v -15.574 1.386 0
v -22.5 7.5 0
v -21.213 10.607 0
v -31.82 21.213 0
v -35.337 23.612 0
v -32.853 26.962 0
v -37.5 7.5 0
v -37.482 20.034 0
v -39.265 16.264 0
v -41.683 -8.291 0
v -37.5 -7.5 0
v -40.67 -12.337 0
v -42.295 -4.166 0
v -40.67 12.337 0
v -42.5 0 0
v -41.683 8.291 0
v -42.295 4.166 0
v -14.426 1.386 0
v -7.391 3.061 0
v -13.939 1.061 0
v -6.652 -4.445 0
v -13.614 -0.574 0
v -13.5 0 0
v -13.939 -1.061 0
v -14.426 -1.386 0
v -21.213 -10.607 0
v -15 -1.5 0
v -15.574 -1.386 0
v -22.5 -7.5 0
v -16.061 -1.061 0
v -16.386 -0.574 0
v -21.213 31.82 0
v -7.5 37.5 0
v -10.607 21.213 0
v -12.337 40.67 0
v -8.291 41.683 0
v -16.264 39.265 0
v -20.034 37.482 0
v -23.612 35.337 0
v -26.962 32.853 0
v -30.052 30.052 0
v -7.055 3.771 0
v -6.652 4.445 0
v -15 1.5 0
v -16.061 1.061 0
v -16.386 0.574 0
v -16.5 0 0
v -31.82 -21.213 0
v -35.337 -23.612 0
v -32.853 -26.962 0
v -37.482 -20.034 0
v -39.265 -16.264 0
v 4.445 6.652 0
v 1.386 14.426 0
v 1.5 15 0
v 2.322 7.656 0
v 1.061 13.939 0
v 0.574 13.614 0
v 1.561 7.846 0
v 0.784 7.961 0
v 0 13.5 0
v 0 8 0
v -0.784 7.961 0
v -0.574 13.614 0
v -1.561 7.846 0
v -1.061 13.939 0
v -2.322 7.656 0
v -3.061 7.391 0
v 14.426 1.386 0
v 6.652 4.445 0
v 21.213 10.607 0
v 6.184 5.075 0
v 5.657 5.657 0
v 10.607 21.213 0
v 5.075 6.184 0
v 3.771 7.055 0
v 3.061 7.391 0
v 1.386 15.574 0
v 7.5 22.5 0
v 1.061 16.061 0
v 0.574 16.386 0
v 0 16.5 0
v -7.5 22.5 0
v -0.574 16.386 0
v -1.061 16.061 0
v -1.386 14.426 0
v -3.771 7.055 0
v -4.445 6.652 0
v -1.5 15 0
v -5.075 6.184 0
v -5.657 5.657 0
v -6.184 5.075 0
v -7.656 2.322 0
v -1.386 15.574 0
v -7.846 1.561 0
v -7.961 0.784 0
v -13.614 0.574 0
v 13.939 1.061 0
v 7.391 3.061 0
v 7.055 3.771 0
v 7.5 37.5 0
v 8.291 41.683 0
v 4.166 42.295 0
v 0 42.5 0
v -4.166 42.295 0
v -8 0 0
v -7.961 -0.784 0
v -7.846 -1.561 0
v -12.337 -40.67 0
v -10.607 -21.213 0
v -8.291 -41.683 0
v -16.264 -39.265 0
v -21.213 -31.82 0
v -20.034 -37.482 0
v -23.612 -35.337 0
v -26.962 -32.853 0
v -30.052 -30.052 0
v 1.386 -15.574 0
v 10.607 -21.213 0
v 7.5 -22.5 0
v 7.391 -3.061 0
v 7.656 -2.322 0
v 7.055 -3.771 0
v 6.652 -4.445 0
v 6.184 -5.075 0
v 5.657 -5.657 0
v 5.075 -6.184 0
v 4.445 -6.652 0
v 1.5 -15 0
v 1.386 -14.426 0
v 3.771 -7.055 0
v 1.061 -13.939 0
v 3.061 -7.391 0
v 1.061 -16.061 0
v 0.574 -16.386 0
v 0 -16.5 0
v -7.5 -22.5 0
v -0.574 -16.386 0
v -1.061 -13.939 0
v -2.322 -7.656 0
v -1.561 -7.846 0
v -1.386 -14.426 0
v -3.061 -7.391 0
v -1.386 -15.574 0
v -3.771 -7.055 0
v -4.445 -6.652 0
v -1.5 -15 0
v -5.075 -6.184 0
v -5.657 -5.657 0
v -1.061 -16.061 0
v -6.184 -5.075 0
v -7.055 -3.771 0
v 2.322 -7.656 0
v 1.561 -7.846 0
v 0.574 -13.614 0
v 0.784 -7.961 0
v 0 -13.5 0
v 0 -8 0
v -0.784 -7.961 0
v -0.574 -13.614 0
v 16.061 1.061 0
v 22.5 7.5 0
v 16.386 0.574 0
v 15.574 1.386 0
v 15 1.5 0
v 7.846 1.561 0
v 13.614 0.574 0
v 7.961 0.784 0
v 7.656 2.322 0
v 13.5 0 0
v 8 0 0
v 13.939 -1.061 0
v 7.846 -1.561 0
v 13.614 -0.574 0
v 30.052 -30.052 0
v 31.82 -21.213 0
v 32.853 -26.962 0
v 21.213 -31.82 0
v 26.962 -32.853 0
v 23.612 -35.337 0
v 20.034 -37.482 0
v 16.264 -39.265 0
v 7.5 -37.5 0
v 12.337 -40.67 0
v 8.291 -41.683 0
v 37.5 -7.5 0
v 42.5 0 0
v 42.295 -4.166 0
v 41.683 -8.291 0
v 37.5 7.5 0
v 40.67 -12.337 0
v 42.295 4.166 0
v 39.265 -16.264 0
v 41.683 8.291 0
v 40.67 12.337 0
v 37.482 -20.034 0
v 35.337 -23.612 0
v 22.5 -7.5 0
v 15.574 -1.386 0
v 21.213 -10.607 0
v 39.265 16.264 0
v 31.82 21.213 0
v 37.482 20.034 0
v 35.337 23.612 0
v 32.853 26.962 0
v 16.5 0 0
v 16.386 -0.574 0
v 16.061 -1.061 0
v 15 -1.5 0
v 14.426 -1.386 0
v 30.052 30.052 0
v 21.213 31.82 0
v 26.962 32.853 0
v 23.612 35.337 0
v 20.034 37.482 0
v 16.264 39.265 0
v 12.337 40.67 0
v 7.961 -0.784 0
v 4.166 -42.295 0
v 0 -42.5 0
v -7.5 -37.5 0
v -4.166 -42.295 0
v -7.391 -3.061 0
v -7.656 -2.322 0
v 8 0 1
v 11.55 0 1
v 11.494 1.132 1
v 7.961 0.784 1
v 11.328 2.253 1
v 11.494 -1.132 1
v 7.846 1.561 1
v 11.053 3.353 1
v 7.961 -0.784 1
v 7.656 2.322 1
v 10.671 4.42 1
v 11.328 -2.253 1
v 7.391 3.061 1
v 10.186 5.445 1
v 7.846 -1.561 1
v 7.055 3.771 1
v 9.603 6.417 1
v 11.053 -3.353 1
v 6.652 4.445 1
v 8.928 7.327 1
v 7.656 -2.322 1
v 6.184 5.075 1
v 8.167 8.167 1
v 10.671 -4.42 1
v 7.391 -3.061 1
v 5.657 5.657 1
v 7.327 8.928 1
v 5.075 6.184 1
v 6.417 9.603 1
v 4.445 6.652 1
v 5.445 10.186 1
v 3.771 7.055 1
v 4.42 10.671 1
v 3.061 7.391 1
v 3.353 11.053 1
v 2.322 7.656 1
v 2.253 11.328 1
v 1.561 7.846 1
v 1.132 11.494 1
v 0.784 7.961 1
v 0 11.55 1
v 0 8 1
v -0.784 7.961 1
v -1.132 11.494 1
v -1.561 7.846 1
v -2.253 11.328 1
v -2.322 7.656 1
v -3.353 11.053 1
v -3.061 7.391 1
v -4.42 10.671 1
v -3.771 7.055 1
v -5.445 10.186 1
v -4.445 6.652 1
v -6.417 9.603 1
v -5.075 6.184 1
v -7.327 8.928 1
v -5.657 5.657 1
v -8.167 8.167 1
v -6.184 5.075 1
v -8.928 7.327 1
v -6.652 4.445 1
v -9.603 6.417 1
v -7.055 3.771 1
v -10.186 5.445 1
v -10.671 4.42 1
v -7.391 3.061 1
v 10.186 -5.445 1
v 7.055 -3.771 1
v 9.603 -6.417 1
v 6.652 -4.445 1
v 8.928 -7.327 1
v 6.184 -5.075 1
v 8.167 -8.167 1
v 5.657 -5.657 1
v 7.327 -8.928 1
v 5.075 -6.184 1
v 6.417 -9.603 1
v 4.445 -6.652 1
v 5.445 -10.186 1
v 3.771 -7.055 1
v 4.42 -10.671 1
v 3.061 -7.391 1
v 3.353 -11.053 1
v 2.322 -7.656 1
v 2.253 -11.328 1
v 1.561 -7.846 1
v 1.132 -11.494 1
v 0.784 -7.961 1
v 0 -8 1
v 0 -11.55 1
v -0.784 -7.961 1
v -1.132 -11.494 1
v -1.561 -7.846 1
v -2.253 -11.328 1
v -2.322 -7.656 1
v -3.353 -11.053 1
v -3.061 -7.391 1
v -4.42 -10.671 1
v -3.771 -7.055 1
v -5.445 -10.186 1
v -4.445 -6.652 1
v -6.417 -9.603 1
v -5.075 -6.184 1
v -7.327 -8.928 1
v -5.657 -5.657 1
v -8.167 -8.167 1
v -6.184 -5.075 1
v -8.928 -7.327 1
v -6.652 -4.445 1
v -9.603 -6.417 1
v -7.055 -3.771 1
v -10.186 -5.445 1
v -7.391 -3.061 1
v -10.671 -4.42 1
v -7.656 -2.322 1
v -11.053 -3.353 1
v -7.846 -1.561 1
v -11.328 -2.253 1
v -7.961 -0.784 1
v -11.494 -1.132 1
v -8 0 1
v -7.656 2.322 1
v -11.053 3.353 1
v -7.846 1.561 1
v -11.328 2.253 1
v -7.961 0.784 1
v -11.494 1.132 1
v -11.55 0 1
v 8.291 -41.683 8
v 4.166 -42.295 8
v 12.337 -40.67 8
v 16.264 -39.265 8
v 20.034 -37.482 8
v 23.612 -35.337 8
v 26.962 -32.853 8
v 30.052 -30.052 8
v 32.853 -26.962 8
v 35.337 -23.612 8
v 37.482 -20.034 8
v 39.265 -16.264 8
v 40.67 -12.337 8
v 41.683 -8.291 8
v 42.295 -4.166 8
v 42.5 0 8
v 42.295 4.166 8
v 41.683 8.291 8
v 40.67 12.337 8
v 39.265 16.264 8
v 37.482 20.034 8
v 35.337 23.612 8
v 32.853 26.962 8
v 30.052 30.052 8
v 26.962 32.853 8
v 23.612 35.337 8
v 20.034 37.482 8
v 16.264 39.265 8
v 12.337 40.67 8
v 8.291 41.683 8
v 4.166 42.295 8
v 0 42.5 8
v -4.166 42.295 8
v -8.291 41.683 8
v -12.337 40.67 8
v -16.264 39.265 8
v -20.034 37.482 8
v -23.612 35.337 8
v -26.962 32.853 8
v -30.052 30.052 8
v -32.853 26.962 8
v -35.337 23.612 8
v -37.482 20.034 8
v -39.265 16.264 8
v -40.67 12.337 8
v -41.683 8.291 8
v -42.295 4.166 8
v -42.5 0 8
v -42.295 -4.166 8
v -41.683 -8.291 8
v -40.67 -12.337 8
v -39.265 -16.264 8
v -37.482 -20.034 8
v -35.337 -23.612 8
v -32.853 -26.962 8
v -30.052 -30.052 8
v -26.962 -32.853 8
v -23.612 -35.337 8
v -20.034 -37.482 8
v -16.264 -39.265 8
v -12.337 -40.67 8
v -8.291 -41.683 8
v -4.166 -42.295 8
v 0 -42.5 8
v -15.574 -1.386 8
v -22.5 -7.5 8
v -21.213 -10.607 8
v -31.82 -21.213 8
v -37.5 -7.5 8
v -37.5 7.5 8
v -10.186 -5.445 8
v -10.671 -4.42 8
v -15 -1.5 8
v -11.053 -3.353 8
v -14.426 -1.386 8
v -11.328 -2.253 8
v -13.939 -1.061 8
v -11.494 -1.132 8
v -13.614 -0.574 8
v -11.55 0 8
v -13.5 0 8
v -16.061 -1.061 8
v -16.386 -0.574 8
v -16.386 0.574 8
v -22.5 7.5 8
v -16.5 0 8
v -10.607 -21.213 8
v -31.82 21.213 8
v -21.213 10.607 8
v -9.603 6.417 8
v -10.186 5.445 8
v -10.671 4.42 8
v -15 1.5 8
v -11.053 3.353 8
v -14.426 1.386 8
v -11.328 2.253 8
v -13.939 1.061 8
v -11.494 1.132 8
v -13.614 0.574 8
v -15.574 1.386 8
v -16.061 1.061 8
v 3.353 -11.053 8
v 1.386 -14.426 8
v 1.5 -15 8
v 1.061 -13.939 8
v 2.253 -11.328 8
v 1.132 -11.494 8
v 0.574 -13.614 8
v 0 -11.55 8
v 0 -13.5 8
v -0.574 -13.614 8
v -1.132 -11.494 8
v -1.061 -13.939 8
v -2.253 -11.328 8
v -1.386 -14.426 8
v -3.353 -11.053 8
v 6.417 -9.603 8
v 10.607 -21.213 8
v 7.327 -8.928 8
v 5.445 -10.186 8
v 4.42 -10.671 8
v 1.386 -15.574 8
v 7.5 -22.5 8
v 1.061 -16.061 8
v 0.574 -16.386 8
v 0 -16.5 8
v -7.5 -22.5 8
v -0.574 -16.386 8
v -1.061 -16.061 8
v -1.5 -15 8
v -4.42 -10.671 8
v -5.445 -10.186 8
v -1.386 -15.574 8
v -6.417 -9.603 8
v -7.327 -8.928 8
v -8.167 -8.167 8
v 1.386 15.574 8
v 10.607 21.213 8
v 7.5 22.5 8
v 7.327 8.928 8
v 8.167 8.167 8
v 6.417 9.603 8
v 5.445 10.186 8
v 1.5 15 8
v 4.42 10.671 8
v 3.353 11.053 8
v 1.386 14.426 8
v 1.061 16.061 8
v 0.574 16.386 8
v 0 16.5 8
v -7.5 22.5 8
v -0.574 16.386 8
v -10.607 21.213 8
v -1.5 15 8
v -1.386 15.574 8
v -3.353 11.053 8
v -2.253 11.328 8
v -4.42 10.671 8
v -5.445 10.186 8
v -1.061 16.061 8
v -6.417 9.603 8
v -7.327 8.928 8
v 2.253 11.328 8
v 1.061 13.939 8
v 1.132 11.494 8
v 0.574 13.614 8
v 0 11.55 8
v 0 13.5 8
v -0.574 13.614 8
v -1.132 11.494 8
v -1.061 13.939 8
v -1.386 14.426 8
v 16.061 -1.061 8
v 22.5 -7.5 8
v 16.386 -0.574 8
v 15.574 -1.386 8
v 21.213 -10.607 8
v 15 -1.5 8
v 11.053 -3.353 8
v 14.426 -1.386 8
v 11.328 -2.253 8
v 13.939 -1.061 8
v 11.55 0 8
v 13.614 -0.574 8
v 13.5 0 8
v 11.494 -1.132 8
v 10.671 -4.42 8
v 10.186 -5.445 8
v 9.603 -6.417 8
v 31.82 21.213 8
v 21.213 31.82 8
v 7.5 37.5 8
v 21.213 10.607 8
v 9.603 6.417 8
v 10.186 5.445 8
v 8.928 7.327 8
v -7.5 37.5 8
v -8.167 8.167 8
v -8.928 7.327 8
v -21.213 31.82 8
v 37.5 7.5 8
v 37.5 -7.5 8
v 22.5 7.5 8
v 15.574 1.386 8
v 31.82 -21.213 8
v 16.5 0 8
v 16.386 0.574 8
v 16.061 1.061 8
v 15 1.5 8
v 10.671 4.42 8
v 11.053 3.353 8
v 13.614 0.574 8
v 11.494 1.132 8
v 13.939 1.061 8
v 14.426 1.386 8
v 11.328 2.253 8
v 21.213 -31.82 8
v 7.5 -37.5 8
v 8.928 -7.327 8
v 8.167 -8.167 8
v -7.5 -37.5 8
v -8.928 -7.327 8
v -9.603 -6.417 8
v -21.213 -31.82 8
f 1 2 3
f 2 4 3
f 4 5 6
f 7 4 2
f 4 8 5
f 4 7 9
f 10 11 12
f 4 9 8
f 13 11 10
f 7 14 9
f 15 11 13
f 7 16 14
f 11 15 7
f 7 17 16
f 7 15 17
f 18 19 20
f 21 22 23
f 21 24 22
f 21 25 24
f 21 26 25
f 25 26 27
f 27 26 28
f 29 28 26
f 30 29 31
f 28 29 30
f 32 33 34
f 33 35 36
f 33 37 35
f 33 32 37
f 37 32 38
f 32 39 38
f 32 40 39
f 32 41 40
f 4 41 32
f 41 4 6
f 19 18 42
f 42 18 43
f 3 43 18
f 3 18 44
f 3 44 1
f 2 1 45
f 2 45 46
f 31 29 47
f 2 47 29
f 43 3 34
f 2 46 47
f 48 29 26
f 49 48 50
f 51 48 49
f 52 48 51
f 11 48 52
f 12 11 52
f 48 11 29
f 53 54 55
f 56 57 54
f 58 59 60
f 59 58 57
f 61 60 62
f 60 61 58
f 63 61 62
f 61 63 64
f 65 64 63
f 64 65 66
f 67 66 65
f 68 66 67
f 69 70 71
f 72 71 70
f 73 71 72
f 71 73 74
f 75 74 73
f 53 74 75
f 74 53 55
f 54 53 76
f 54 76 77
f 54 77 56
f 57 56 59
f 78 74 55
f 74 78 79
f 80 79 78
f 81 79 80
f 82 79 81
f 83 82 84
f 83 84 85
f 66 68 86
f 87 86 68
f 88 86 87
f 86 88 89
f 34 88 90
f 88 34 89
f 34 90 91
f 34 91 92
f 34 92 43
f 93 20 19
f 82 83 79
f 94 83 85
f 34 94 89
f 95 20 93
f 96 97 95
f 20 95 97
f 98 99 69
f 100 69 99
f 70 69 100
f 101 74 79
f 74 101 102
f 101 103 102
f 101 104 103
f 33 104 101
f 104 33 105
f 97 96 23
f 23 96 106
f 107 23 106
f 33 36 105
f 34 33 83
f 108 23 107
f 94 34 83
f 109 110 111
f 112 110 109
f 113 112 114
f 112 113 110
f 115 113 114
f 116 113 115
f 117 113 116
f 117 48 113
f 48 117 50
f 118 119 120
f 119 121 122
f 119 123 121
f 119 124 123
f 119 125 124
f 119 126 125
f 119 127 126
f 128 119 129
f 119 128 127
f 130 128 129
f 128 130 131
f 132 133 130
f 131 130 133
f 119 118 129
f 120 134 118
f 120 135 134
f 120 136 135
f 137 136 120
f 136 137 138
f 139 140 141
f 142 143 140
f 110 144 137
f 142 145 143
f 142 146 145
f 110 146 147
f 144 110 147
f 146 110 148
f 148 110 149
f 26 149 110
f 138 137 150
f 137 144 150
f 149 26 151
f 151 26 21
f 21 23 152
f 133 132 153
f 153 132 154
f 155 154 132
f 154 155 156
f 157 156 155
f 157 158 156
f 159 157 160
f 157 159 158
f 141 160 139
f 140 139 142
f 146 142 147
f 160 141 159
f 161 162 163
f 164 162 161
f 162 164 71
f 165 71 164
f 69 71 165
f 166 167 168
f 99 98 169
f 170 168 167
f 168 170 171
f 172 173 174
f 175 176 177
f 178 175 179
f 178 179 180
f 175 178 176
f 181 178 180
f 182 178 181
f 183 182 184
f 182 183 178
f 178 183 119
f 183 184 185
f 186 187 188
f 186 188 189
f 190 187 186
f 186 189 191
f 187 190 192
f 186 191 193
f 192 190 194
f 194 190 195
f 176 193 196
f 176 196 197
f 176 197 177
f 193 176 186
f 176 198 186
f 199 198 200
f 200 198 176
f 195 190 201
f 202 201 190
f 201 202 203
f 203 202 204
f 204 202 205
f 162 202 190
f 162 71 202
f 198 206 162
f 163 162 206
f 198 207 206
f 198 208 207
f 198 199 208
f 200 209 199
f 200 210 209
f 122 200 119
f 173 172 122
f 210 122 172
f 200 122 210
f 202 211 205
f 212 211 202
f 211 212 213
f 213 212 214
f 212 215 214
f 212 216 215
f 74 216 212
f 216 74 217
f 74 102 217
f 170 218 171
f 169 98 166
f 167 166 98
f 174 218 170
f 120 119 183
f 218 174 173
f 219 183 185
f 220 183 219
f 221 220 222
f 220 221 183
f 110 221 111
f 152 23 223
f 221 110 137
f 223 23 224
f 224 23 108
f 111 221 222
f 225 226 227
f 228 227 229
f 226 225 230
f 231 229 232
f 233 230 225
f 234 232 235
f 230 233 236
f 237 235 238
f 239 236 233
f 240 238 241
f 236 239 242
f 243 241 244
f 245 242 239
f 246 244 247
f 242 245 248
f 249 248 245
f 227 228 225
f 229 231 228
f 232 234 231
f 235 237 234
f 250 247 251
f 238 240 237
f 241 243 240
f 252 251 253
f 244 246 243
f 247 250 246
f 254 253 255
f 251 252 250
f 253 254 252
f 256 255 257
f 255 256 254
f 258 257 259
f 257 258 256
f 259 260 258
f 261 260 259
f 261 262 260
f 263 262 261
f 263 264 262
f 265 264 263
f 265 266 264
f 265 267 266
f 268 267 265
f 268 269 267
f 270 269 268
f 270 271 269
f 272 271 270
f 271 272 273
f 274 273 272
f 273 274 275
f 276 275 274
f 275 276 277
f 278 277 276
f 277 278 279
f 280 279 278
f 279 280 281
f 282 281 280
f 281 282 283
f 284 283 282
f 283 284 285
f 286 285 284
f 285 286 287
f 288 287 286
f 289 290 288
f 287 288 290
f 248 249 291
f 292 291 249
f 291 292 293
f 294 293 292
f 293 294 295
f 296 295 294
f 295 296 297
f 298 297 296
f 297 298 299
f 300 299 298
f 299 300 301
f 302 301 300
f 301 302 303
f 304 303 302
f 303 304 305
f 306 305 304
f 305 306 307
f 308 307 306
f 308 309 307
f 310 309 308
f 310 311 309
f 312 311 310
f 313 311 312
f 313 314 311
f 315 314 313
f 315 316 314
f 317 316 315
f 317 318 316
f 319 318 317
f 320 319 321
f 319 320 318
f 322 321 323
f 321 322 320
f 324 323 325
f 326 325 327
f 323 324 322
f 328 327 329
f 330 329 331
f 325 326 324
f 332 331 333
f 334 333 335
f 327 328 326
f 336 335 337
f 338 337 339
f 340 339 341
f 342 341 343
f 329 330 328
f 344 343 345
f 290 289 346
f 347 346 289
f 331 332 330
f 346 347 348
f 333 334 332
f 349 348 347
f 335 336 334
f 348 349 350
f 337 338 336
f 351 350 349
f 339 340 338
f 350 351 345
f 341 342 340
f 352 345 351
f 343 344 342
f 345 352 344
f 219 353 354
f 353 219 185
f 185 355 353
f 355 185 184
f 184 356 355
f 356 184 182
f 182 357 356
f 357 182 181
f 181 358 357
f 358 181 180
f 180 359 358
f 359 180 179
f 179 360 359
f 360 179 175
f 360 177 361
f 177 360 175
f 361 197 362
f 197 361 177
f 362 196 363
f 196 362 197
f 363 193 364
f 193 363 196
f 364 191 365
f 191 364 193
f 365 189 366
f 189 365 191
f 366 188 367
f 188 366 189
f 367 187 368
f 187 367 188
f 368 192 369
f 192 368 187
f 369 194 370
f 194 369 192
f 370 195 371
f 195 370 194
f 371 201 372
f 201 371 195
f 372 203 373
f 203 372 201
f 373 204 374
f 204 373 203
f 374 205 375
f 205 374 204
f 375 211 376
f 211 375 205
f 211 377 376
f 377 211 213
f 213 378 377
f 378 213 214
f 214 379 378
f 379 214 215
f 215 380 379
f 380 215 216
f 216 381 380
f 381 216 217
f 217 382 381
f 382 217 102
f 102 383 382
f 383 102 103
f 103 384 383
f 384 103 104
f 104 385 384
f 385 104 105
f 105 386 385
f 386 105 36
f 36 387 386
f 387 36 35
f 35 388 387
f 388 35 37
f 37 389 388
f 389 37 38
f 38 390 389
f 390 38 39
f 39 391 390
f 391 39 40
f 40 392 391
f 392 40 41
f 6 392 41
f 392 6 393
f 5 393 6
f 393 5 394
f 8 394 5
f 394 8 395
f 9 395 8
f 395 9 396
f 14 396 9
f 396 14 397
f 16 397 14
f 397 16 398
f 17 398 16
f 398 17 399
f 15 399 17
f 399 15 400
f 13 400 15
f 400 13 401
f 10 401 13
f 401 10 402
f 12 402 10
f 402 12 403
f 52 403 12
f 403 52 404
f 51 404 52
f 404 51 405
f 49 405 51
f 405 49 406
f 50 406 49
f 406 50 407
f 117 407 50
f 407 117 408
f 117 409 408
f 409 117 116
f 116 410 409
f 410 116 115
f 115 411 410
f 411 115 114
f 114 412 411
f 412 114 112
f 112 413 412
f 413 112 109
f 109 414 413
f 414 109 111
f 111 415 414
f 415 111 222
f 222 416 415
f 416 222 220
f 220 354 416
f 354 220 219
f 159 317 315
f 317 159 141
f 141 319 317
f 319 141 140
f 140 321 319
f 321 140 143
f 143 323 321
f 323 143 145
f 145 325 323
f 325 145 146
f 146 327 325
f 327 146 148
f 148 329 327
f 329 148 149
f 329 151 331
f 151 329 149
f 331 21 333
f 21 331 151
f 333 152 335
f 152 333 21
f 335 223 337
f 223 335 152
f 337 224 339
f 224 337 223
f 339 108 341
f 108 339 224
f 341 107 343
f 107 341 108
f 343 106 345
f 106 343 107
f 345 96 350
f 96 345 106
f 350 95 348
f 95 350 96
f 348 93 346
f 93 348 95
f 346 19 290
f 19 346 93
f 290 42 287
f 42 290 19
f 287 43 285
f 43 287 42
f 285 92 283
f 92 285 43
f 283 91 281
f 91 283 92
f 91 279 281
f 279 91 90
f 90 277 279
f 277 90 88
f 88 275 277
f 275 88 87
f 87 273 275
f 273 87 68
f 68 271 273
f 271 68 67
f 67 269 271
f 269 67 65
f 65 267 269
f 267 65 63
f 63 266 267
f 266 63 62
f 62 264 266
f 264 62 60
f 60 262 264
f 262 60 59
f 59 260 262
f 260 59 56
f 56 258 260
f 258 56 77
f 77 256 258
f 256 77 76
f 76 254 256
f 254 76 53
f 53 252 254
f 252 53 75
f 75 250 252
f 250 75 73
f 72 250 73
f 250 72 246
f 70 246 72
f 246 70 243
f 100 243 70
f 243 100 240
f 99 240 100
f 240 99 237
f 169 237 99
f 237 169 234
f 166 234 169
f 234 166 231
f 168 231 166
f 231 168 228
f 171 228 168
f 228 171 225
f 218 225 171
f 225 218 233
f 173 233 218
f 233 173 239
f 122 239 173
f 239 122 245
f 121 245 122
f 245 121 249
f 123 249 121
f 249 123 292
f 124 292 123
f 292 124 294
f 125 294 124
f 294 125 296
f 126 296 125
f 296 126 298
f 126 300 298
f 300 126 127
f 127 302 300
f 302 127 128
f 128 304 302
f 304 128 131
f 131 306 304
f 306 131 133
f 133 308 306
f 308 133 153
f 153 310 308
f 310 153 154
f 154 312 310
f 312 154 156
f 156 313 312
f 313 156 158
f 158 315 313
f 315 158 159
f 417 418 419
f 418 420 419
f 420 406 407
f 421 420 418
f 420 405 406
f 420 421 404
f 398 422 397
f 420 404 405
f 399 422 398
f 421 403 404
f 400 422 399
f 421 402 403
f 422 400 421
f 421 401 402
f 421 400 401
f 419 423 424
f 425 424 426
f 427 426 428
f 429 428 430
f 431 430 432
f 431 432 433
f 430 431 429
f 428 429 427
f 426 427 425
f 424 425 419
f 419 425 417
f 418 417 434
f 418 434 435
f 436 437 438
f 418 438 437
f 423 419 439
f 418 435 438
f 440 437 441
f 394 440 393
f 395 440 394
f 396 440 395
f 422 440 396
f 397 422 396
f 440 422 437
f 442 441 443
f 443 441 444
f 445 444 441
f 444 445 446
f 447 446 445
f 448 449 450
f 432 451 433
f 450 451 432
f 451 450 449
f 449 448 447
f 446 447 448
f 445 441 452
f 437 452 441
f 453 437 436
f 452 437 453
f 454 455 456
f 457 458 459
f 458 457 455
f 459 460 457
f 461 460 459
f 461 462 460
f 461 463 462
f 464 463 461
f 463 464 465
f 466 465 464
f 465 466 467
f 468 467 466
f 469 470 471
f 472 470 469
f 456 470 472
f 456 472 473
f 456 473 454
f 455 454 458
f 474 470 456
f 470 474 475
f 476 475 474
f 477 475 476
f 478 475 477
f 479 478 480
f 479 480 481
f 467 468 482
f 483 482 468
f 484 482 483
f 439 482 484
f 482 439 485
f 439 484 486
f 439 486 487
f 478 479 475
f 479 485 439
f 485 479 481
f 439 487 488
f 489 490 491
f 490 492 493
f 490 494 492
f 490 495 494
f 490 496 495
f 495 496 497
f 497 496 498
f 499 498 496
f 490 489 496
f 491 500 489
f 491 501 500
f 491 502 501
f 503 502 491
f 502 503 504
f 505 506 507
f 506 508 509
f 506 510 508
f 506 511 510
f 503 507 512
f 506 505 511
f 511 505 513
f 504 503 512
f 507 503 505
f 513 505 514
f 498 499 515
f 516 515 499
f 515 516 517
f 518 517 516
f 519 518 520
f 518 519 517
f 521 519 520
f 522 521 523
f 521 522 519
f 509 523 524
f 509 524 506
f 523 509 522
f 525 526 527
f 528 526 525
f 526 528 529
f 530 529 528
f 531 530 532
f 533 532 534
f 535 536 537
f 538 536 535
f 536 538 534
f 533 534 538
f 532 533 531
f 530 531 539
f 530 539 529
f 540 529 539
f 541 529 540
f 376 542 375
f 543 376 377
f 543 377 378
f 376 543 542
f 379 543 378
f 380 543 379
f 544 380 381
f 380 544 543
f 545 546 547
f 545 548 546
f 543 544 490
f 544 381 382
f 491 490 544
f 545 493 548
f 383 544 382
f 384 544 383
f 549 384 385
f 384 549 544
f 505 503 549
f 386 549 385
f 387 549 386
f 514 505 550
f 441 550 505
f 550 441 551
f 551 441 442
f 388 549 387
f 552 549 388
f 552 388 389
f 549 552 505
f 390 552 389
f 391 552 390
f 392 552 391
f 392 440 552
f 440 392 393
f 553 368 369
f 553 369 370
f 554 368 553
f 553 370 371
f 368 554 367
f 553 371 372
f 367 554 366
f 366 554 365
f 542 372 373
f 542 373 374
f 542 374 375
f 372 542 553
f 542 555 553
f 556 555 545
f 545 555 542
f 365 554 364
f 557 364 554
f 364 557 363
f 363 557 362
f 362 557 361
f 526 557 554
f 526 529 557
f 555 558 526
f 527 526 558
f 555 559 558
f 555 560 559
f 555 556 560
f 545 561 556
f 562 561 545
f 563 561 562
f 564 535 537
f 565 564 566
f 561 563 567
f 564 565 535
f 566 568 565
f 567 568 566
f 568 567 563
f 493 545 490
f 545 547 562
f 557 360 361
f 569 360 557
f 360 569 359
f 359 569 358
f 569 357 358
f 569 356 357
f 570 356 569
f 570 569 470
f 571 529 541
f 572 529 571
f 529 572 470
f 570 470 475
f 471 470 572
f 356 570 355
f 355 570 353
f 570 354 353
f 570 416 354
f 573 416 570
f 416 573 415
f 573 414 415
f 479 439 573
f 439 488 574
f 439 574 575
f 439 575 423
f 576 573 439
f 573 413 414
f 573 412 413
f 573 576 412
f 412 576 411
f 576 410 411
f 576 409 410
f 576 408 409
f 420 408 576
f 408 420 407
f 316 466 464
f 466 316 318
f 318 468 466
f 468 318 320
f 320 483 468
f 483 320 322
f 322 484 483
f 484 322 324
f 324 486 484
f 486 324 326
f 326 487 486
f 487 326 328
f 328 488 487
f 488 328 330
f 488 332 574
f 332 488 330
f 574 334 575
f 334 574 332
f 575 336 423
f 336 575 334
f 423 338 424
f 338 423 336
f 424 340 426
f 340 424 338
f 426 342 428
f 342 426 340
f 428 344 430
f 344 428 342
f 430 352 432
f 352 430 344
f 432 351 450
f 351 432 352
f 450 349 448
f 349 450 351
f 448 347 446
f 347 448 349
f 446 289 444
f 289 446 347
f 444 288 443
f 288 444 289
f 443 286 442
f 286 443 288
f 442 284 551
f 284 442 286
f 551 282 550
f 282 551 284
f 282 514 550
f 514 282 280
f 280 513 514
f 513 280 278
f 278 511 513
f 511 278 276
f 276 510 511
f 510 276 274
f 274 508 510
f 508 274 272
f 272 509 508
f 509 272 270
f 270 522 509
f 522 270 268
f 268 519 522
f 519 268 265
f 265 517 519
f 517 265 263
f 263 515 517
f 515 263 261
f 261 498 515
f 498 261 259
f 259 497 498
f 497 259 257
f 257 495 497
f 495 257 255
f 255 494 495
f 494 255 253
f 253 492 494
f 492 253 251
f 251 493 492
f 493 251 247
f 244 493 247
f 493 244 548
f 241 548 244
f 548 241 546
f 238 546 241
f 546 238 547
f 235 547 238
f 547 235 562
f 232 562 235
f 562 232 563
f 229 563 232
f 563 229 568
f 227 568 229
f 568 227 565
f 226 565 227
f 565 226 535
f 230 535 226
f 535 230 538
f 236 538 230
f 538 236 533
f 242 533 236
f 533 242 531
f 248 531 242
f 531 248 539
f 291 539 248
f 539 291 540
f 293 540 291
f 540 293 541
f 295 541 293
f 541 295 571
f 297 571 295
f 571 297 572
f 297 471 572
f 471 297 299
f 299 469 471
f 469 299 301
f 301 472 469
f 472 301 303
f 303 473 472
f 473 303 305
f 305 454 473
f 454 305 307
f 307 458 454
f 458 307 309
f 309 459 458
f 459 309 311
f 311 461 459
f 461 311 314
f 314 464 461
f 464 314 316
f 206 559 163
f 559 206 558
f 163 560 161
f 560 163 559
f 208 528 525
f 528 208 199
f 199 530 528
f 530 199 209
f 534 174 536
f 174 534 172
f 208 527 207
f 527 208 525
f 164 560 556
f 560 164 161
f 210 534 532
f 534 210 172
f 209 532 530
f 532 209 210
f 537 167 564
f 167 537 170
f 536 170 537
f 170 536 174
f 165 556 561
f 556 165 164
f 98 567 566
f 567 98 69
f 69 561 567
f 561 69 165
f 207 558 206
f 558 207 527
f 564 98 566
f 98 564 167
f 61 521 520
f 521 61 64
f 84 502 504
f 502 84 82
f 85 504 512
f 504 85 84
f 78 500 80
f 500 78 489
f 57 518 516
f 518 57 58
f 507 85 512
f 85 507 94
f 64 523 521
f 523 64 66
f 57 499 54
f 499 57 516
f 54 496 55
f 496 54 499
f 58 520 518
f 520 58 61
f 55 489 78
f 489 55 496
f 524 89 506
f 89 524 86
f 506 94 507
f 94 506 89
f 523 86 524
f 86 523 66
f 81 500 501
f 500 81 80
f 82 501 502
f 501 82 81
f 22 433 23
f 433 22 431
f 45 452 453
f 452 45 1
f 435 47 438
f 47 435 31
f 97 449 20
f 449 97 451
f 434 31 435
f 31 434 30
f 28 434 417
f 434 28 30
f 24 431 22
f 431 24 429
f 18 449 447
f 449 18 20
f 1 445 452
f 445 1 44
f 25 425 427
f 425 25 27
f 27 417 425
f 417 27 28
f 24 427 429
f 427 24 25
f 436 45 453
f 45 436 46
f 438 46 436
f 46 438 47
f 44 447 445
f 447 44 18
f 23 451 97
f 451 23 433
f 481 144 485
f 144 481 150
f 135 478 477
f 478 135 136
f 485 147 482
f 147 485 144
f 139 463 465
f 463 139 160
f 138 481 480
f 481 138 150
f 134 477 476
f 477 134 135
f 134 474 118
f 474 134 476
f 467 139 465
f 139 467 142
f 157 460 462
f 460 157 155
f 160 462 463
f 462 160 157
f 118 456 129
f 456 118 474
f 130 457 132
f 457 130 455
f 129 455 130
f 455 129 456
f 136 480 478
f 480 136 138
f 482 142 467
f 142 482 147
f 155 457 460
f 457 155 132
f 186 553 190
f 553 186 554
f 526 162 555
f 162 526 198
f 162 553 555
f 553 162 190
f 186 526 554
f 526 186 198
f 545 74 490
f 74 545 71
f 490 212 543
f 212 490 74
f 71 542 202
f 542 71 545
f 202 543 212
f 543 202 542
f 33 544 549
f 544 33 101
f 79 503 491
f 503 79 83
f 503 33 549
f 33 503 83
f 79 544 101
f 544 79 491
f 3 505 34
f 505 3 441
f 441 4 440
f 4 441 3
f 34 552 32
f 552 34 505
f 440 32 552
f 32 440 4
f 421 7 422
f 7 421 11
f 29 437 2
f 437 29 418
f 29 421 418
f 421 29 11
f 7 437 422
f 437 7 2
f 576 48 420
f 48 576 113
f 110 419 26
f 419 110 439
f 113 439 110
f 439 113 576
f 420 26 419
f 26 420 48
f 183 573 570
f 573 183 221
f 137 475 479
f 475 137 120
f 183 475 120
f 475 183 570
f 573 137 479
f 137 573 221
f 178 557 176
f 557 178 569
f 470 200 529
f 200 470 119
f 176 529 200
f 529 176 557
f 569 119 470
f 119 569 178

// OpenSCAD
$fn=64; 
E=0.01;

wheel_od = 85;
wheel_width = 8;
bearing_od = 22 * 1.05;
bearing_od_margin = 16; // diameter we can do a flange without hitting nuts
bearing_width = 7;
wheel_width = 8;
screw_dia = 3;
screw_head_dia = 6;
sprocket_teeth = 64;
sprocket_width = 7;
gap_width = 2;
screw_offset = 15;

part1=1;
part2=0;

module washer(od,id,h) {
    linear_extrude(h) difference() {
        circle(d=od);
        circle(d=id);
    }
}

if (part1) difference() {
    union() {
        h = wheel_width-bearing_width;
        translate([0,0,0]) washer(od=wheel_od,id=bearing_od_margin,h=h);
        translate([0,0,h]) washer(od=wheel_od,id=bearing_od,h=bearing_width);
    }
    for (theta = [0:90:360-1]) {
        rotate([0,0,theta]) translate([screw_offset,0,-E]) cylinder(d=screw_dia,h=30,$fn=16);
    }
    
    // these holes are hackey and quick and don't follow the object parameters set at the top
    for (theta = [0:360/8:360-1]) {
        //rotate([0,0,theta]) translate([30,0,-E]) cylinder(d=15,h=20);
        rotate([0,0,theta]) translate([30,0,-E]) cube([15,15,40],center=true);
        //rotate([0,0,theta]) translate([12,0,-E]) cylinder(d=7,h=20);
    }


}    
//color([1,0,0,0.5]) translate([0,0,8]) washer(od=85,id=16,h=1);

if (part2) color([0,1,1,0.5]) translate([0,0,wheel_width]) {
    difference() {
        union() {
            flange_id = 36/60 * sprocket_teeth; // experimentally derived due to laziness
            flange_od = flange_id+4; // experimentally derived due to laziness
                            
            color([0,1,0,0.5]) cylinder(d=flange_od,h=gap_width); // gap
            
            translate([0,0,gap_width]) {
                cylinder(d1=flange_od,d2=flange_id,h=1.6);
                gt2_sprocket(sprocket_teeth,sprocket_width);
                translate([0,0,7-0.6]) cylinder(d1=flange_id,d2=flange_od,h=1.6);
            }
        }
        translate([0,0,-E]) cylinder(d=bearing_od_margin,h=20);
        for (theta = [0:90:360-1]) {
            rotate([0,0,theta]) translate([screw_offset,0,7-3]) cylinder(d=screw_head_dia,h=10,$fn=16);
            rotate([0,0,theta]) translate([screw_offset,0,-E]) cylinder(d=screw_dia,h=10,$fn=16);
        }

    }
}

module gt2_sprocket(number_of_teeth=36,height=7) {
    toothed_part_length = height;
    base_height=0;
    additional_tooth_width = 0.2; //mm
    additional_tooth_depth = 0; //mm
    tooth_width =  1.494 ;
    tooth_depth = 0.764;

    GT2_2mm_pulley_dia = tooth_spacing (2,0.254);
    pulley_OD = GT2_2mm_pulley_dia;


    function tooth_spaceing_curvefit (b,c,d)
        = ((c * pow(number_of_teeth,d)) / (b + pow(number_of_teeth,d))) * number_of_teeth ;

    function tooth_spacing(tooth_pitch,pitch_line_offset)
        = (2*((number_of_teeth*tooth_pitch)/(3.14159265*2)-pitch_line_offset)) ;


    tooth_distance_from_centre = sqrt( pow(pulley_OD/2,2) - pow((tooth_width+additional_tooth_width)/2,2));
        tooth_width_scale = (tooth_width + additional_tooth_width ) / tooth_width;
        tooth_depth_scale = ((tooth_depth + additional_tooth_depth ) / tooth_depth) ;


    difference() {
        //shaft - diameter is outside diameter of pulley
        
        translate([0,0,base_height]) 
        rotate ([0,0,360/(number_of_teeth*4)]) 
        cylinder(r=pulley_OD/2,h=toothed_part_length, $fn=number_of_teeth*4);

        //teeth - cut out of shaft

        for(i=[1:number_of_teeth]) 
        rotate([0,0,i*(360/number_of_teeth)])
        translate([0,-tooth_distance_from_centre,base_height -1]) 
        scale ([ tooth_width_scale , tooth_depth_scale , 1 ]) {
            GT2_2mm(toothed_part_length);
        }

    }
}

module GT2_2mm(h) {
	linear_extrude(height=h+2) polygon([[0.747183,-0.5],[0.747183,0],[0.647876,0.037218],[0.598311,0.130528],[0.578556,0.238423],[0.547158,0.343077],[0.504649,0.443762],[0.451556,0.53975],[0.358229,0.636924],[0.2484,0.707276],[0.127259,0.750044],[0,0.76447],[-0.127259,0.750044],[-0.2484,0.707276],[-0.358229,0.636924],[-0.451556,0.53975],[-0.504797,0.443762],[-0.547291,0.343077],[-0.578605,0.238423],[-0.598311,0.130528],[-0.648009,0.037218],[-0.747183,0],[-0.747183,-0.5]]);
}
